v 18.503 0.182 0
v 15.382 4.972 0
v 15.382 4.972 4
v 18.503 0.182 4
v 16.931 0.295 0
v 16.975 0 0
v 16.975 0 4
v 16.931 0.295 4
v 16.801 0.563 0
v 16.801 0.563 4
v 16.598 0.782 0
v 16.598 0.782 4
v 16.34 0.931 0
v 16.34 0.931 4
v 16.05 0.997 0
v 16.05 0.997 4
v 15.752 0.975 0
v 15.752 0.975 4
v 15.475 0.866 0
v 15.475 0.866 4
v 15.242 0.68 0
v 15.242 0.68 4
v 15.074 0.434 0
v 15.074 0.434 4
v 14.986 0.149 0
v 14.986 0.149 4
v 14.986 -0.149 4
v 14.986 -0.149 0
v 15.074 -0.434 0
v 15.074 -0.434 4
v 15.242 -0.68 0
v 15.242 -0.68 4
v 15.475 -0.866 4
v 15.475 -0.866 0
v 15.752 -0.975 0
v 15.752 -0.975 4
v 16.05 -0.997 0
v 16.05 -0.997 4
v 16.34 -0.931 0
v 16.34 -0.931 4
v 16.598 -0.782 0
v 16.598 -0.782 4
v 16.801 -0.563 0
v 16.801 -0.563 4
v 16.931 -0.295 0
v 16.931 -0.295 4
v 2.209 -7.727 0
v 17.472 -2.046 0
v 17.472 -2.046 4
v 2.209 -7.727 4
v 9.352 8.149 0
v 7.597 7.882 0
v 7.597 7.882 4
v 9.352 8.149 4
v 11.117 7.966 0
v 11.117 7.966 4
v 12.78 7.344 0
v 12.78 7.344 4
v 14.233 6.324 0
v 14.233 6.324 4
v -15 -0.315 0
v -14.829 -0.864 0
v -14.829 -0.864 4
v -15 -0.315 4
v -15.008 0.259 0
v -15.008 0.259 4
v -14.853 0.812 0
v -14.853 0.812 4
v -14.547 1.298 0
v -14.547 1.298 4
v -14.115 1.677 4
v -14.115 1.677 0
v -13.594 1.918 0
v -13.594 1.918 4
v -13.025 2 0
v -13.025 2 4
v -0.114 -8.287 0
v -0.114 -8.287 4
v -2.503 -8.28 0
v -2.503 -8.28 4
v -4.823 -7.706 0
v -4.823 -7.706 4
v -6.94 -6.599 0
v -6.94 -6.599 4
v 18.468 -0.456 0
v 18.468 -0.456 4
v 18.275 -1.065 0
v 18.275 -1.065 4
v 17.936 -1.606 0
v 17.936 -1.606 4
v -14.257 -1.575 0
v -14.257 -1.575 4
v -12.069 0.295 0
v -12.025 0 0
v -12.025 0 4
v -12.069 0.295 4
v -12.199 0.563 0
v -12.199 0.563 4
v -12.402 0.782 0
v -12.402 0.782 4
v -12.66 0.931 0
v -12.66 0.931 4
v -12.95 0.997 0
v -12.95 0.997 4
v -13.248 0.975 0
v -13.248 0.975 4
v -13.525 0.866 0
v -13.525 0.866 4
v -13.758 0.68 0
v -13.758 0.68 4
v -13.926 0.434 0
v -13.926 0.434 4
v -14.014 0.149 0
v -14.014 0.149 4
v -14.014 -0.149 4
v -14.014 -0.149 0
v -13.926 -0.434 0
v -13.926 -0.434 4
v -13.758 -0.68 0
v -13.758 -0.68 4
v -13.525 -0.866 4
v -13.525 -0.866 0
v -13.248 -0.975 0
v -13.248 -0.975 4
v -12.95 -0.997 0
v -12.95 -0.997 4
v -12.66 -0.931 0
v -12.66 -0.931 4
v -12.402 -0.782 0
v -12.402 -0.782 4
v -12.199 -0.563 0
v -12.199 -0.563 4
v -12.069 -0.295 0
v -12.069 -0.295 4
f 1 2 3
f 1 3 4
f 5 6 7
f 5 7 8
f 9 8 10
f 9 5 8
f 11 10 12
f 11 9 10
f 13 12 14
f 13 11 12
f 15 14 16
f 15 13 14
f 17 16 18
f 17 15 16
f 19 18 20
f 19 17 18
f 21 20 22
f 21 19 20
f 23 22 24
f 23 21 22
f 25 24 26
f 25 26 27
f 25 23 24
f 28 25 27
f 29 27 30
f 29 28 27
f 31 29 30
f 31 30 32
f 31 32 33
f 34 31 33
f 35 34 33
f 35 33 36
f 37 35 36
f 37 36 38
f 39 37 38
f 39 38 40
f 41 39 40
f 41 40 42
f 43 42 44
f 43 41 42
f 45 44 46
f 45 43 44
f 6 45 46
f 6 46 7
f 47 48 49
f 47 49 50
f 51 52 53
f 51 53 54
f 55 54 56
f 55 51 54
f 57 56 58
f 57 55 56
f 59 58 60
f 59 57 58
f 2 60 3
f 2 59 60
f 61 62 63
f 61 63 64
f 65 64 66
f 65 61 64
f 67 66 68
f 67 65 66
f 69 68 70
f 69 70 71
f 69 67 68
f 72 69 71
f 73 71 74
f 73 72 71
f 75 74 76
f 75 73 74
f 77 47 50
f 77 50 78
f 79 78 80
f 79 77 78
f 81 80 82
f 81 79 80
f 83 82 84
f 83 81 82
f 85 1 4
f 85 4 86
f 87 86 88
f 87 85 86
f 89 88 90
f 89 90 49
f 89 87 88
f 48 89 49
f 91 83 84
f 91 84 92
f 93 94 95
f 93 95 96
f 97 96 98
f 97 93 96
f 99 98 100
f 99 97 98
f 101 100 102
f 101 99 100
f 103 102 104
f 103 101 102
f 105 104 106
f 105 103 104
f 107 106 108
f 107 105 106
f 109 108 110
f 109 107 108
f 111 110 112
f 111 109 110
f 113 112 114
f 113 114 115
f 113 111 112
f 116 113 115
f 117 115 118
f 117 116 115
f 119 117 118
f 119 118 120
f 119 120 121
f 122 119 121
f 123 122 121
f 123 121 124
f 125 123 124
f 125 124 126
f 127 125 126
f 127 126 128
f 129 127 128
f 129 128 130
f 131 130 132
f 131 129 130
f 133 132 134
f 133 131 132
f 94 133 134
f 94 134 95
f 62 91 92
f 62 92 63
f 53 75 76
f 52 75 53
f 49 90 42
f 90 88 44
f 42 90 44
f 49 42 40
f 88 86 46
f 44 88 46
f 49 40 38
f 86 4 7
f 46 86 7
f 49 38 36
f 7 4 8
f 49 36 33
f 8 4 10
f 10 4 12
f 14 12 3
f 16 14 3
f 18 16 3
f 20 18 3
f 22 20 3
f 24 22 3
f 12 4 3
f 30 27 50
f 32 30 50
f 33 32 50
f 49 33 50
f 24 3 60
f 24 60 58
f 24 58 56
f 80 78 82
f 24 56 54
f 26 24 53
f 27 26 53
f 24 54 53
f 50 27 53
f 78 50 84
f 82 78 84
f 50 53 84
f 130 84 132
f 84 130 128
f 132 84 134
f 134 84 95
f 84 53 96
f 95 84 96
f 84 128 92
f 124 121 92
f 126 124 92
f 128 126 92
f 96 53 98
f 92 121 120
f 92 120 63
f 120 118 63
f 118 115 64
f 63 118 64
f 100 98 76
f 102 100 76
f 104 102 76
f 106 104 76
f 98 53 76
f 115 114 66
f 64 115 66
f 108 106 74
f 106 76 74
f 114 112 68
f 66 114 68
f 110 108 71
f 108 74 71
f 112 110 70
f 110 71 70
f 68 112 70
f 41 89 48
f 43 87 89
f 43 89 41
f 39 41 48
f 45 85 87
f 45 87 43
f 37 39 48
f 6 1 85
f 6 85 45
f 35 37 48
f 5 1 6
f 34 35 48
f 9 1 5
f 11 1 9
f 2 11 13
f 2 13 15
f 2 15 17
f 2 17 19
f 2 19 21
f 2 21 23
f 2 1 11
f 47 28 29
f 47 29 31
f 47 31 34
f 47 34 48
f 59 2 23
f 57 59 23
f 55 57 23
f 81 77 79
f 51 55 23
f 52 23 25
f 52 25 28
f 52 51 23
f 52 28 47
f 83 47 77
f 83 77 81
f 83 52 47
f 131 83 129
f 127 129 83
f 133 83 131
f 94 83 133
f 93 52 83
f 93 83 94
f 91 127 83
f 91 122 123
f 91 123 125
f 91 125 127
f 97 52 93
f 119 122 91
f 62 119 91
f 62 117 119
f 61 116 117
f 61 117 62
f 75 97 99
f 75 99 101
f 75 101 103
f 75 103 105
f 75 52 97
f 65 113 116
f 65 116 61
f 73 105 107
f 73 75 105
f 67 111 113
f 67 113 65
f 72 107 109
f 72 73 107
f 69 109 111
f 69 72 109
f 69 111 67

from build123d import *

# Parameters (mm, degrees)
SKETCH1_R           = 1
BOSS_EXTRUDE1_DEPTH = 4


with BuildPart() as part:
    # Sketch1 → Boss-Extrude1 (new body)
    with BuildSketch(Plane.XY):
        with BuildLine():
            Line((-14.257280668, -1.575118781), (-14.828930549, -0.86376259))
            ThreePointArc((-14.828930549, -0.86376259), (-14.717335158, 1.065944375), (-13.025069638, 2))
            Line((-13.025069638, 2), (7.597126091, 7.882366595))
            ThreePointArc((7.597126091, 7.882366595), (11.968265738, 7.707732331), (15.382140621, 4.972258475))
            Line((15.382140621, 4.972258475), (18.503191116, 0.182221363))
            ThreePointArc((18.503191116, 0.182221363), (18.275196012, -1.064934274), (17.471757811, -2.045681953))
            Line((17.471757811, -2.045681953), (2.208569451, -7.726919547))
            ThreePointArc((2.208569451, -7.726919547), (-2.503379707, -8.279944918), (-6.939921558, -6.599052796))
            Line((-6.939921558, -6.599052796), (-14.257280668, -1.575118781))
        make_face()
        with Locations((15.974930362, 0)):
            Circle(SKETCH1_R, mode=Mode.SUBTRACT)
        with Locations((-13.025069638, 0)):
            Circle(SKETCH1_R, mode=Mode.SUBTRACT)
    extrude(amount=BOSS_EXTRUDE1_DEPTH)


solid = part.part
